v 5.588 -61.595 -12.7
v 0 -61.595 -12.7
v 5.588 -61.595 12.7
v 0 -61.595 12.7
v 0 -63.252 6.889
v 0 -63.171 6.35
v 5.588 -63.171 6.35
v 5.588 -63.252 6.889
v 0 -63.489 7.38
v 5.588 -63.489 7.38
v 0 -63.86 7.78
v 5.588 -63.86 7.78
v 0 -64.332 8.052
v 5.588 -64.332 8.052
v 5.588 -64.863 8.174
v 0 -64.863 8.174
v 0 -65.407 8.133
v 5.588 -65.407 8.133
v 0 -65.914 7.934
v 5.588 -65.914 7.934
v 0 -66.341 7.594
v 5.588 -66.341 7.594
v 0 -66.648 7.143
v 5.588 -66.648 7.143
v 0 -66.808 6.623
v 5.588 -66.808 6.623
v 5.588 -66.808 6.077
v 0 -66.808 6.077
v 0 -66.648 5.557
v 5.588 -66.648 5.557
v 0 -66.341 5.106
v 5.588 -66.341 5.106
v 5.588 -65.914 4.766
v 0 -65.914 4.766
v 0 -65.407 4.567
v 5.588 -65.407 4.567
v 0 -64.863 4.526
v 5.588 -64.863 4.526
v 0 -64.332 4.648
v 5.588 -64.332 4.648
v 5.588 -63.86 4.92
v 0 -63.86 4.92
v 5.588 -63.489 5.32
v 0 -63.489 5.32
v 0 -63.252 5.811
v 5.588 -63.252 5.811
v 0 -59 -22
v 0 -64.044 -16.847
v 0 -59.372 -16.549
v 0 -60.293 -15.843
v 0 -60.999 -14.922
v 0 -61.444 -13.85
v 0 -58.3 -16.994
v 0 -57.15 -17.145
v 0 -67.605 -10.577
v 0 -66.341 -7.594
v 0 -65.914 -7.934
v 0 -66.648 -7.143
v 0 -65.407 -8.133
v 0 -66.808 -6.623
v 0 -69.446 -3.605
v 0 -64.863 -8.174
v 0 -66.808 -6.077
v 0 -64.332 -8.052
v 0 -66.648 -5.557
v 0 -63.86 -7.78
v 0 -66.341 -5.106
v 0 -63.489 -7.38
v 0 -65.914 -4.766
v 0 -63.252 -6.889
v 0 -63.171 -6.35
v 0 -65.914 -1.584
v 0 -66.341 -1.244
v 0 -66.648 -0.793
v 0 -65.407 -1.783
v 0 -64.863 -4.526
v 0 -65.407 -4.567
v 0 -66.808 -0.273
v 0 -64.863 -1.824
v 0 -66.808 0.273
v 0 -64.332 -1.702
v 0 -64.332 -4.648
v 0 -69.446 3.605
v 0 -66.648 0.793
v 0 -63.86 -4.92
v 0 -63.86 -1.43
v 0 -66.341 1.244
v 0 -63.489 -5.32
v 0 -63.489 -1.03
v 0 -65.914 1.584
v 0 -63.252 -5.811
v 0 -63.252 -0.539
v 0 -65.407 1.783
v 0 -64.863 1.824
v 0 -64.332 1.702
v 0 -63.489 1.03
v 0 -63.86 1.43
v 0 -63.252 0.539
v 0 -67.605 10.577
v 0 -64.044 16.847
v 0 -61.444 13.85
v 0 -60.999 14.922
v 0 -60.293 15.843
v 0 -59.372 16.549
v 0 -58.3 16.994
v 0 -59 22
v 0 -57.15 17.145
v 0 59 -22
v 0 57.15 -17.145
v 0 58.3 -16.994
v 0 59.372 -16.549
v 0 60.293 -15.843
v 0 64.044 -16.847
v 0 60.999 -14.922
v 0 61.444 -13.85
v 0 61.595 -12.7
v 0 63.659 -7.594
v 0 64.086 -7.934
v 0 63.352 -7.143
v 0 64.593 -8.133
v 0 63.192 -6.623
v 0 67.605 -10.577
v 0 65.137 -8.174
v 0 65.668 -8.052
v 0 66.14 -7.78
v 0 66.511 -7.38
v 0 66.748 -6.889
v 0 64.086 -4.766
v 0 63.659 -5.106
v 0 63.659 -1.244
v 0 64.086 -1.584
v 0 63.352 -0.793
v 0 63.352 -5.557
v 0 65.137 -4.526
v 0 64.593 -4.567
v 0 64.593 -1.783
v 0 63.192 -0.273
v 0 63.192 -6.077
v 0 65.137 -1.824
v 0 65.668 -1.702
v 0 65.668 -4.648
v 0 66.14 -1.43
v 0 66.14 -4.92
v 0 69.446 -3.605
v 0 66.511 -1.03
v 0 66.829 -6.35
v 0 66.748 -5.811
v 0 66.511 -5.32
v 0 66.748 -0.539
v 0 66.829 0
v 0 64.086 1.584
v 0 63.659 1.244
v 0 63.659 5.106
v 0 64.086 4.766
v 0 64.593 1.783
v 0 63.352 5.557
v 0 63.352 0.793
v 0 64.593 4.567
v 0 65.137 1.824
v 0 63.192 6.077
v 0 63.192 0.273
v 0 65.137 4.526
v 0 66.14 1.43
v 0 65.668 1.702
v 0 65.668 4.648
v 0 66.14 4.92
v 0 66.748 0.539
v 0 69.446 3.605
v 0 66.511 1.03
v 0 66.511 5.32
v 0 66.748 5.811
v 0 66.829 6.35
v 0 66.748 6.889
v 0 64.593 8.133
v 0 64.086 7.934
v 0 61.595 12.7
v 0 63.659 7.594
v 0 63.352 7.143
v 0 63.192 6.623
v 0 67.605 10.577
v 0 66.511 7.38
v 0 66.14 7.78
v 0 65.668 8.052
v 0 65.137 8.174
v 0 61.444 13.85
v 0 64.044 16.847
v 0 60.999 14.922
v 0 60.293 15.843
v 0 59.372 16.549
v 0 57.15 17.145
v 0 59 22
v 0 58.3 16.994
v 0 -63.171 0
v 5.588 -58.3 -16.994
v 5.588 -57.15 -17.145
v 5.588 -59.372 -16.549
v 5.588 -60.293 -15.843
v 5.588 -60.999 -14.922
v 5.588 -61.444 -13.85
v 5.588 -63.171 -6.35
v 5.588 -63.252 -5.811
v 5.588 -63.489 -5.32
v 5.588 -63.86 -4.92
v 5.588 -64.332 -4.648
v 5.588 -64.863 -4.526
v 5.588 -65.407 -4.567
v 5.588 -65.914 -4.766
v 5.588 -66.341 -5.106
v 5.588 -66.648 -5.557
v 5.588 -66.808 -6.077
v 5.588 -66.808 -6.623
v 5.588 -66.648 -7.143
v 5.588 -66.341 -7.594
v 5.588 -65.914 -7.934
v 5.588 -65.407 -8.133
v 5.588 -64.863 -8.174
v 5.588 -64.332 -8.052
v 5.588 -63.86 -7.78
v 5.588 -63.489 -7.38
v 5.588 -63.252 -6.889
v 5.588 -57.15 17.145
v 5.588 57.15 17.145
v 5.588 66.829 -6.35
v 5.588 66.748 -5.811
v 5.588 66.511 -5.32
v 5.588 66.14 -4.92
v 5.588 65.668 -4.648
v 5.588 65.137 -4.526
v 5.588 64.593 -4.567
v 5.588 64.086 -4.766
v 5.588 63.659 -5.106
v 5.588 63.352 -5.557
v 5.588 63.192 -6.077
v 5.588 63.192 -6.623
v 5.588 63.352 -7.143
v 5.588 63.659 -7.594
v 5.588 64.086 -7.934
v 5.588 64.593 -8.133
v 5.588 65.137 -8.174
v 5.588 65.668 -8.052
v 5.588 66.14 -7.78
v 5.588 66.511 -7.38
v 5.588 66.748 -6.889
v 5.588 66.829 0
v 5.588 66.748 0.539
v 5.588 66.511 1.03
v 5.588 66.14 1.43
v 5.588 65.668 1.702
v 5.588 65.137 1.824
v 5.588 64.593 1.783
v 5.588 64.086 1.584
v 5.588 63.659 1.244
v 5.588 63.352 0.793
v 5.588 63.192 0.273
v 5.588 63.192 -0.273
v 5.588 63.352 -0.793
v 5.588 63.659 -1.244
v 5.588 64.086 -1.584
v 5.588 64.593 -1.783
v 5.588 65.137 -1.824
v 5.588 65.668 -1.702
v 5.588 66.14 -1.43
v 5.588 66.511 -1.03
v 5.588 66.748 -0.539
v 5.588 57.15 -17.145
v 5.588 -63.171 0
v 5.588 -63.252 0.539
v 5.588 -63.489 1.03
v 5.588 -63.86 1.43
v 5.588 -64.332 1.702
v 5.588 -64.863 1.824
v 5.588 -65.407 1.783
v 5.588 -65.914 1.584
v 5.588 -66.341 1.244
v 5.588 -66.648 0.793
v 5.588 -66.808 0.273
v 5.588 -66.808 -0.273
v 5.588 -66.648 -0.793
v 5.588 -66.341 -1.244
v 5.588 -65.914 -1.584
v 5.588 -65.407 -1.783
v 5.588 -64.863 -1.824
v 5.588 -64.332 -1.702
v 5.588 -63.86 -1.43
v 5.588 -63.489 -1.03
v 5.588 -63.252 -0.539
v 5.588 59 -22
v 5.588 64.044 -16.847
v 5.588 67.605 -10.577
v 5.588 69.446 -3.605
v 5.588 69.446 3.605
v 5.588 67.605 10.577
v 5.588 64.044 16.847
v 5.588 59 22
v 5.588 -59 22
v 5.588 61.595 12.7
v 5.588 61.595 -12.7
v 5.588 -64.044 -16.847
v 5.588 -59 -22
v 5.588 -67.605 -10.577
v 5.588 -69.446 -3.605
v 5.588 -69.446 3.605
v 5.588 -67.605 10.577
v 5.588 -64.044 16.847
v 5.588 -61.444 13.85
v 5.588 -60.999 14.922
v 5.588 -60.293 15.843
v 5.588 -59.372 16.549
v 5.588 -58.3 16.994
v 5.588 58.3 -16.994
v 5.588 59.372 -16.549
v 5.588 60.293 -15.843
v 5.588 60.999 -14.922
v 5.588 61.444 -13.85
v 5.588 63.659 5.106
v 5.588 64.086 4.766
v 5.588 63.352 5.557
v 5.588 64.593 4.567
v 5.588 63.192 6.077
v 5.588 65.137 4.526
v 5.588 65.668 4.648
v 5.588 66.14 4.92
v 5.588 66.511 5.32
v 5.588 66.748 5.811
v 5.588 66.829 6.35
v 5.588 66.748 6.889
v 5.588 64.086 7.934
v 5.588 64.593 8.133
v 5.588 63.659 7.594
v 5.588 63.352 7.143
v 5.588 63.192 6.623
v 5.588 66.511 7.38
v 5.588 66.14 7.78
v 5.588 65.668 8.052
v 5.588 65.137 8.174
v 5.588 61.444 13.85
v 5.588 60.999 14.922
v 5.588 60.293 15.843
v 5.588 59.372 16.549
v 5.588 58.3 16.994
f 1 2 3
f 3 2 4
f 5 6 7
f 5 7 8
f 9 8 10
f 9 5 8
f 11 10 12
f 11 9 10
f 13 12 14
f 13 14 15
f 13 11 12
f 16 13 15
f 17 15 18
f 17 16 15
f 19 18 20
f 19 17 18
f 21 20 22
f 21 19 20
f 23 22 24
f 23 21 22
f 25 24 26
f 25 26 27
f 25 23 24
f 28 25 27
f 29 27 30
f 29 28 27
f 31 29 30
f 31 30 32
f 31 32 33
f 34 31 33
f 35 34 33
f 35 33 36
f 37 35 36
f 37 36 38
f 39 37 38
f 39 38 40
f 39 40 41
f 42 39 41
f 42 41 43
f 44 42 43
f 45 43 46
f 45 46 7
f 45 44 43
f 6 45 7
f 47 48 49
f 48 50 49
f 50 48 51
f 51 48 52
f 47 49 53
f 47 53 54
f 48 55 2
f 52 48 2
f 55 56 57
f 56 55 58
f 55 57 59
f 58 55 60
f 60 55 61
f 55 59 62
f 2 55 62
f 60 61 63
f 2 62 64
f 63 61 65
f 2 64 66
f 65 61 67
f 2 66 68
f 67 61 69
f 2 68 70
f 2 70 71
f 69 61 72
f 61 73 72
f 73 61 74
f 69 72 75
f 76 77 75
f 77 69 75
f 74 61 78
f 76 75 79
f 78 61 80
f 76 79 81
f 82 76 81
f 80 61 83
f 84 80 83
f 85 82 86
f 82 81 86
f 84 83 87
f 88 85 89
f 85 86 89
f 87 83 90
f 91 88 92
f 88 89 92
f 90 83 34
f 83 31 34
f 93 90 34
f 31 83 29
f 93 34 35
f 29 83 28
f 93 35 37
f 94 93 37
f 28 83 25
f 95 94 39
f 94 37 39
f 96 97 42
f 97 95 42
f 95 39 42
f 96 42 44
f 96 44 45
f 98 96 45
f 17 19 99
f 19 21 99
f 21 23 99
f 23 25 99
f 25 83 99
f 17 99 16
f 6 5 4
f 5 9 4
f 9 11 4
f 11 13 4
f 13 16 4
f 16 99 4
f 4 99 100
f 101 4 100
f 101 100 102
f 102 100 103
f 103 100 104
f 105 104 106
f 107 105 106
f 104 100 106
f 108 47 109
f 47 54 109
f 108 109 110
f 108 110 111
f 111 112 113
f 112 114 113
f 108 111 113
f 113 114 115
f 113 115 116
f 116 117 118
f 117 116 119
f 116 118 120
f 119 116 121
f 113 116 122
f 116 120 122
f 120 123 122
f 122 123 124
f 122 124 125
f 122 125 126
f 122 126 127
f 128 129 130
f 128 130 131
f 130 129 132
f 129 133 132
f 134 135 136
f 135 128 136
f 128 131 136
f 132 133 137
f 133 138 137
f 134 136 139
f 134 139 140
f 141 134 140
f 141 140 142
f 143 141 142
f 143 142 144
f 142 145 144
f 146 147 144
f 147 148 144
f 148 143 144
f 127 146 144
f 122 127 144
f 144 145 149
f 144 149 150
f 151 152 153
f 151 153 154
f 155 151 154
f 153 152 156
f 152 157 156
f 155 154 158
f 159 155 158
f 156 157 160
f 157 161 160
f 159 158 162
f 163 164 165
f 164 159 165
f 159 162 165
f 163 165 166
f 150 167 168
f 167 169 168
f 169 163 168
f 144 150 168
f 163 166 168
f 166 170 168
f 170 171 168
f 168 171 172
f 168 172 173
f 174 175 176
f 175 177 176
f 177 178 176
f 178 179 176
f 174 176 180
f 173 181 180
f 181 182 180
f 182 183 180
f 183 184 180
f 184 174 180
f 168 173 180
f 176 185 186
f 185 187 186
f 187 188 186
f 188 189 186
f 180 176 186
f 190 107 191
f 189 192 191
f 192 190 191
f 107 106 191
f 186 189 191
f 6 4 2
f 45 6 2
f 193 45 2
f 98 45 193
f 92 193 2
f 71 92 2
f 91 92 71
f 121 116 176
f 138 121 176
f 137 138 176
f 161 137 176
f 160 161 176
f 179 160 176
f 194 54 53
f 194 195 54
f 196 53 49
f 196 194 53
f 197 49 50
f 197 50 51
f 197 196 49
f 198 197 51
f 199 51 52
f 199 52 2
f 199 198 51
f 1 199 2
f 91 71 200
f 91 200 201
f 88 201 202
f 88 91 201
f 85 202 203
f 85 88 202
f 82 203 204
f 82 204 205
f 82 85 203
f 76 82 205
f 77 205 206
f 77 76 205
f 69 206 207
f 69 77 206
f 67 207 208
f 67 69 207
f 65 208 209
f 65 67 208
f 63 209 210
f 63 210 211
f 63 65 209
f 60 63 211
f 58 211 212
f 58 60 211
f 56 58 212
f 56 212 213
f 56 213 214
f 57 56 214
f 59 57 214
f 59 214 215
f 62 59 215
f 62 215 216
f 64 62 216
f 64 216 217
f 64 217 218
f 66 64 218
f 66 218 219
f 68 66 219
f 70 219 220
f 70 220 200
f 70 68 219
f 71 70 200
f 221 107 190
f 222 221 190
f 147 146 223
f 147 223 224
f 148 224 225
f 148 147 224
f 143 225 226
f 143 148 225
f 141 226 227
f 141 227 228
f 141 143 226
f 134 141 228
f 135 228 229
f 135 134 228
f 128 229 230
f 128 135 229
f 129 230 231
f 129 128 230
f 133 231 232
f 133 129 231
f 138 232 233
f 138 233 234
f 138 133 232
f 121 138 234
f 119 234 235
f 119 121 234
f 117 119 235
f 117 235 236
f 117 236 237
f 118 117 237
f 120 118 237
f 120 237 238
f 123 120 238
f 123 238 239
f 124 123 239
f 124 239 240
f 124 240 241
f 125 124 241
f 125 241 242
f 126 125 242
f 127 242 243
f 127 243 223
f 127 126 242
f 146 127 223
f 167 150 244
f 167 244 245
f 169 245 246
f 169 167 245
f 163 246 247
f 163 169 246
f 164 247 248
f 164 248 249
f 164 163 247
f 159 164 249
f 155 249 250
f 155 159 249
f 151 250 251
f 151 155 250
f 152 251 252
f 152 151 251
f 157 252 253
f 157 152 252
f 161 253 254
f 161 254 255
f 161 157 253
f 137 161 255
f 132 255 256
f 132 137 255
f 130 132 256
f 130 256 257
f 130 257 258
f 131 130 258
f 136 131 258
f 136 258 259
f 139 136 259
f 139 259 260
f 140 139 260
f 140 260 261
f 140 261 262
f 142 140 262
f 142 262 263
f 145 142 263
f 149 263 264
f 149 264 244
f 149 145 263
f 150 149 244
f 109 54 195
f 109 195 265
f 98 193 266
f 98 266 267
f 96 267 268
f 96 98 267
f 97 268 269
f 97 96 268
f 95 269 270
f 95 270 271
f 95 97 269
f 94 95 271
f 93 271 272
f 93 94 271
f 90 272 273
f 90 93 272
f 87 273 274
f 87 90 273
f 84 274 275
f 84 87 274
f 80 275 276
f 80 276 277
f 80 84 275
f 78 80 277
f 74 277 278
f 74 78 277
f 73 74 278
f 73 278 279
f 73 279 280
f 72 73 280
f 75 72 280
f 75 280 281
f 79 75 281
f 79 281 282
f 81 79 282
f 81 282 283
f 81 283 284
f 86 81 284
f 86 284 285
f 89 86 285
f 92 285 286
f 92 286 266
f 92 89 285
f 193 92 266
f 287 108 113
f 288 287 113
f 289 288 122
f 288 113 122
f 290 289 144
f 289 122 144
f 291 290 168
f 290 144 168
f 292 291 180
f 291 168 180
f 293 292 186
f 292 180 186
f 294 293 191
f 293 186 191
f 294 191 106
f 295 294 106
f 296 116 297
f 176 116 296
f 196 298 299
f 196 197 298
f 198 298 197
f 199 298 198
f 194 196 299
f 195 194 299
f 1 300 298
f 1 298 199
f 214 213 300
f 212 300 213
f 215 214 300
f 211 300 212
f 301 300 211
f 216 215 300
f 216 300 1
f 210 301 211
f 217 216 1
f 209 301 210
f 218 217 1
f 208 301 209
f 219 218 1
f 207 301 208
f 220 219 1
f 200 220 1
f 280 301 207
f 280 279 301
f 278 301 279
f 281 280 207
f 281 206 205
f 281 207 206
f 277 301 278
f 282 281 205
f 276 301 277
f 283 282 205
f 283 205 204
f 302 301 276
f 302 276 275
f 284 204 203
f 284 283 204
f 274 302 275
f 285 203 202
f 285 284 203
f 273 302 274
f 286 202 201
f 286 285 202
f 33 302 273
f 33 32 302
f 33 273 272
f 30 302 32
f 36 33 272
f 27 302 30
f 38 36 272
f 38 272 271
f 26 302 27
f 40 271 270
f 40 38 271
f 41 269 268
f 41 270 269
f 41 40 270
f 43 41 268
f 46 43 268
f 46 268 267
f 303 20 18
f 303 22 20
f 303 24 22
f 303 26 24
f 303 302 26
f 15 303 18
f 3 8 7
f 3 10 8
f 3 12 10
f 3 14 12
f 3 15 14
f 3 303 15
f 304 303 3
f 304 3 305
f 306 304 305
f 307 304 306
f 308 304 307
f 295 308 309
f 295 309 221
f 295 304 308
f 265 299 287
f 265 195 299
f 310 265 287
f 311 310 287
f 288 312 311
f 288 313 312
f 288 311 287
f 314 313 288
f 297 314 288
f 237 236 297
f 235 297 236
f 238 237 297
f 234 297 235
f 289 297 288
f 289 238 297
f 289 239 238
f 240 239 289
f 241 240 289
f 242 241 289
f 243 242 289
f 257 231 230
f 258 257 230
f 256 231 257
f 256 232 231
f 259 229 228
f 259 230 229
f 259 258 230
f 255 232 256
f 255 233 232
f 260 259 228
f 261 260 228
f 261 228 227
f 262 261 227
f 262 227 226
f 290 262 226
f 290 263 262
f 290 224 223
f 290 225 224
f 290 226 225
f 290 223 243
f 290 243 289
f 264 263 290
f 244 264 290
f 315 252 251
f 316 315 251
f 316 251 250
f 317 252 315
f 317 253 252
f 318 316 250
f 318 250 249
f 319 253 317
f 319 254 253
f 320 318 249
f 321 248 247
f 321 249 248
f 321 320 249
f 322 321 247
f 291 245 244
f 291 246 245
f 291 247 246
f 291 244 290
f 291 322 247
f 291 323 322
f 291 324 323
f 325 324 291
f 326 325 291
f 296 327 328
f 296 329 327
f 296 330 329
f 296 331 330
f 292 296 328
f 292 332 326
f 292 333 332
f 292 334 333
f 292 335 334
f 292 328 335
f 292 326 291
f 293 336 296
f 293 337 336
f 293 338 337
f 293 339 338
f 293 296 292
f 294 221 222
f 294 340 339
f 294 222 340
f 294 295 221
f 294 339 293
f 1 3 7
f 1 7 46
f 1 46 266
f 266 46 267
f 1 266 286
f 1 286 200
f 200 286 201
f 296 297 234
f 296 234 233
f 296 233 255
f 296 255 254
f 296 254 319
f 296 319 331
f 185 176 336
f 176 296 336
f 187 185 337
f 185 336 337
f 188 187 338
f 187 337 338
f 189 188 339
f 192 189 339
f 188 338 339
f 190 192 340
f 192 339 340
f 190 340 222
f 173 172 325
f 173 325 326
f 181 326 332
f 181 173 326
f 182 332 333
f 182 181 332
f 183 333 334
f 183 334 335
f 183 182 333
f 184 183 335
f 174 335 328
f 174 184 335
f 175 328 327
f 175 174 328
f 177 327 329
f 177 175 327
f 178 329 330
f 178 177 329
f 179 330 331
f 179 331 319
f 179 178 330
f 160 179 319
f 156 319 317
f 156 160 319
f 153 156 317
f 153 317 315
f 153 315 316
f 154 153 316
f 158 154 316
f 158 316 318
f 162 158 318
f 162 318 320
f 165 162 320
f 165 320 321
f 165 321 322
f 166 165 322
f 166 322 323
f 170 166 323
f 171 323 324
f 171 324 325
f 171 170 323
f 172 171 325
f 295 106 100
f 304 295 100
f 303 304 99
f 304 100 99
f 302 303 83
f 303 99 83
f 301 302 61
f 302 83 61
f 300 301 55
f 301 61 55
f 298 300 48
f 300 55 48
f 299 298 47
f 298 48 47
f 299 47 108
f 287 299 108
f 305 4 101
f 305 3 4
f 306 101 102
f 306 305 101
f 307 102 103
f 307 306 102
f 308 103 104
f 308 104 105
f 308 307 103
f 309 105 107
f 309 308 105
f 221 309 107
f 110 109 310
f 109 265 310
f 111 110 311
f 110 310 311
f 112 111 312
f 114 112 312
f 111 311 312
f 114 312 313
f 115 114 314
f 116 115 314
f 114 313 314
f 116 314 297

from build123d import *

# Parameters (mm, degrees)
F0_R     = 1.8288
F0_W     = 123.19
F0_H     = 34.29
F1_DEPTH = 5.588
F2_R     = 4.445


with BuildPart() as f1:
    # F0 (on Right) → F1 (new body)
    with BuildSketch(Plane.YZ):
        with BuildLine():
            ThreePointArc((59, -22), (69.679492, 0), (59, 22))
            Line((59, 22), (-59, 22))
            ThreePointArc((-59, 22), (-69.679492, 0), (-59, -22))
            Line((-59, -22), (59, -22))
        make_face()
        with Locations((-65, -6.35)):
            Circle(F0_R, mode=Mode.SUBTRACT)
        with Locations((65, -6.35)):
            Circle(F0_R, mode=Mode.SUBTRACT)
        with Locations((-65, 0)):
            Circle(F0_R, mode=Mode.SUBTRACT)
        with Locations((-65, 6.35)):
            Circle(F0_R, mode=Mode.SUBTRACT)
        Rectangle(F0_W, F0_H, mode=Mode.SUBTRACT)
        with Locations((65, 0)):
            Circle(F0_R, mode=Mode.SUBTRACT)
        with Locations((65, 6.35)):
            Circle(F0_R, mode=Mode.SUBTRACT)
    extrude(amount=F1_DEPTH)

    # F2
    f2_edges = [f1.edges().sort_by_distance(p)[0] for p in [
        (2.794, -61.595, 17.145),
        (2.794, -61.595, -17.145),
        (2.794, 61.595, -17.145),
        (2.794, 61.595, 17.145),
    ]]
    fillet(f2_edges, radius=F2_R)


solid = f1.part
